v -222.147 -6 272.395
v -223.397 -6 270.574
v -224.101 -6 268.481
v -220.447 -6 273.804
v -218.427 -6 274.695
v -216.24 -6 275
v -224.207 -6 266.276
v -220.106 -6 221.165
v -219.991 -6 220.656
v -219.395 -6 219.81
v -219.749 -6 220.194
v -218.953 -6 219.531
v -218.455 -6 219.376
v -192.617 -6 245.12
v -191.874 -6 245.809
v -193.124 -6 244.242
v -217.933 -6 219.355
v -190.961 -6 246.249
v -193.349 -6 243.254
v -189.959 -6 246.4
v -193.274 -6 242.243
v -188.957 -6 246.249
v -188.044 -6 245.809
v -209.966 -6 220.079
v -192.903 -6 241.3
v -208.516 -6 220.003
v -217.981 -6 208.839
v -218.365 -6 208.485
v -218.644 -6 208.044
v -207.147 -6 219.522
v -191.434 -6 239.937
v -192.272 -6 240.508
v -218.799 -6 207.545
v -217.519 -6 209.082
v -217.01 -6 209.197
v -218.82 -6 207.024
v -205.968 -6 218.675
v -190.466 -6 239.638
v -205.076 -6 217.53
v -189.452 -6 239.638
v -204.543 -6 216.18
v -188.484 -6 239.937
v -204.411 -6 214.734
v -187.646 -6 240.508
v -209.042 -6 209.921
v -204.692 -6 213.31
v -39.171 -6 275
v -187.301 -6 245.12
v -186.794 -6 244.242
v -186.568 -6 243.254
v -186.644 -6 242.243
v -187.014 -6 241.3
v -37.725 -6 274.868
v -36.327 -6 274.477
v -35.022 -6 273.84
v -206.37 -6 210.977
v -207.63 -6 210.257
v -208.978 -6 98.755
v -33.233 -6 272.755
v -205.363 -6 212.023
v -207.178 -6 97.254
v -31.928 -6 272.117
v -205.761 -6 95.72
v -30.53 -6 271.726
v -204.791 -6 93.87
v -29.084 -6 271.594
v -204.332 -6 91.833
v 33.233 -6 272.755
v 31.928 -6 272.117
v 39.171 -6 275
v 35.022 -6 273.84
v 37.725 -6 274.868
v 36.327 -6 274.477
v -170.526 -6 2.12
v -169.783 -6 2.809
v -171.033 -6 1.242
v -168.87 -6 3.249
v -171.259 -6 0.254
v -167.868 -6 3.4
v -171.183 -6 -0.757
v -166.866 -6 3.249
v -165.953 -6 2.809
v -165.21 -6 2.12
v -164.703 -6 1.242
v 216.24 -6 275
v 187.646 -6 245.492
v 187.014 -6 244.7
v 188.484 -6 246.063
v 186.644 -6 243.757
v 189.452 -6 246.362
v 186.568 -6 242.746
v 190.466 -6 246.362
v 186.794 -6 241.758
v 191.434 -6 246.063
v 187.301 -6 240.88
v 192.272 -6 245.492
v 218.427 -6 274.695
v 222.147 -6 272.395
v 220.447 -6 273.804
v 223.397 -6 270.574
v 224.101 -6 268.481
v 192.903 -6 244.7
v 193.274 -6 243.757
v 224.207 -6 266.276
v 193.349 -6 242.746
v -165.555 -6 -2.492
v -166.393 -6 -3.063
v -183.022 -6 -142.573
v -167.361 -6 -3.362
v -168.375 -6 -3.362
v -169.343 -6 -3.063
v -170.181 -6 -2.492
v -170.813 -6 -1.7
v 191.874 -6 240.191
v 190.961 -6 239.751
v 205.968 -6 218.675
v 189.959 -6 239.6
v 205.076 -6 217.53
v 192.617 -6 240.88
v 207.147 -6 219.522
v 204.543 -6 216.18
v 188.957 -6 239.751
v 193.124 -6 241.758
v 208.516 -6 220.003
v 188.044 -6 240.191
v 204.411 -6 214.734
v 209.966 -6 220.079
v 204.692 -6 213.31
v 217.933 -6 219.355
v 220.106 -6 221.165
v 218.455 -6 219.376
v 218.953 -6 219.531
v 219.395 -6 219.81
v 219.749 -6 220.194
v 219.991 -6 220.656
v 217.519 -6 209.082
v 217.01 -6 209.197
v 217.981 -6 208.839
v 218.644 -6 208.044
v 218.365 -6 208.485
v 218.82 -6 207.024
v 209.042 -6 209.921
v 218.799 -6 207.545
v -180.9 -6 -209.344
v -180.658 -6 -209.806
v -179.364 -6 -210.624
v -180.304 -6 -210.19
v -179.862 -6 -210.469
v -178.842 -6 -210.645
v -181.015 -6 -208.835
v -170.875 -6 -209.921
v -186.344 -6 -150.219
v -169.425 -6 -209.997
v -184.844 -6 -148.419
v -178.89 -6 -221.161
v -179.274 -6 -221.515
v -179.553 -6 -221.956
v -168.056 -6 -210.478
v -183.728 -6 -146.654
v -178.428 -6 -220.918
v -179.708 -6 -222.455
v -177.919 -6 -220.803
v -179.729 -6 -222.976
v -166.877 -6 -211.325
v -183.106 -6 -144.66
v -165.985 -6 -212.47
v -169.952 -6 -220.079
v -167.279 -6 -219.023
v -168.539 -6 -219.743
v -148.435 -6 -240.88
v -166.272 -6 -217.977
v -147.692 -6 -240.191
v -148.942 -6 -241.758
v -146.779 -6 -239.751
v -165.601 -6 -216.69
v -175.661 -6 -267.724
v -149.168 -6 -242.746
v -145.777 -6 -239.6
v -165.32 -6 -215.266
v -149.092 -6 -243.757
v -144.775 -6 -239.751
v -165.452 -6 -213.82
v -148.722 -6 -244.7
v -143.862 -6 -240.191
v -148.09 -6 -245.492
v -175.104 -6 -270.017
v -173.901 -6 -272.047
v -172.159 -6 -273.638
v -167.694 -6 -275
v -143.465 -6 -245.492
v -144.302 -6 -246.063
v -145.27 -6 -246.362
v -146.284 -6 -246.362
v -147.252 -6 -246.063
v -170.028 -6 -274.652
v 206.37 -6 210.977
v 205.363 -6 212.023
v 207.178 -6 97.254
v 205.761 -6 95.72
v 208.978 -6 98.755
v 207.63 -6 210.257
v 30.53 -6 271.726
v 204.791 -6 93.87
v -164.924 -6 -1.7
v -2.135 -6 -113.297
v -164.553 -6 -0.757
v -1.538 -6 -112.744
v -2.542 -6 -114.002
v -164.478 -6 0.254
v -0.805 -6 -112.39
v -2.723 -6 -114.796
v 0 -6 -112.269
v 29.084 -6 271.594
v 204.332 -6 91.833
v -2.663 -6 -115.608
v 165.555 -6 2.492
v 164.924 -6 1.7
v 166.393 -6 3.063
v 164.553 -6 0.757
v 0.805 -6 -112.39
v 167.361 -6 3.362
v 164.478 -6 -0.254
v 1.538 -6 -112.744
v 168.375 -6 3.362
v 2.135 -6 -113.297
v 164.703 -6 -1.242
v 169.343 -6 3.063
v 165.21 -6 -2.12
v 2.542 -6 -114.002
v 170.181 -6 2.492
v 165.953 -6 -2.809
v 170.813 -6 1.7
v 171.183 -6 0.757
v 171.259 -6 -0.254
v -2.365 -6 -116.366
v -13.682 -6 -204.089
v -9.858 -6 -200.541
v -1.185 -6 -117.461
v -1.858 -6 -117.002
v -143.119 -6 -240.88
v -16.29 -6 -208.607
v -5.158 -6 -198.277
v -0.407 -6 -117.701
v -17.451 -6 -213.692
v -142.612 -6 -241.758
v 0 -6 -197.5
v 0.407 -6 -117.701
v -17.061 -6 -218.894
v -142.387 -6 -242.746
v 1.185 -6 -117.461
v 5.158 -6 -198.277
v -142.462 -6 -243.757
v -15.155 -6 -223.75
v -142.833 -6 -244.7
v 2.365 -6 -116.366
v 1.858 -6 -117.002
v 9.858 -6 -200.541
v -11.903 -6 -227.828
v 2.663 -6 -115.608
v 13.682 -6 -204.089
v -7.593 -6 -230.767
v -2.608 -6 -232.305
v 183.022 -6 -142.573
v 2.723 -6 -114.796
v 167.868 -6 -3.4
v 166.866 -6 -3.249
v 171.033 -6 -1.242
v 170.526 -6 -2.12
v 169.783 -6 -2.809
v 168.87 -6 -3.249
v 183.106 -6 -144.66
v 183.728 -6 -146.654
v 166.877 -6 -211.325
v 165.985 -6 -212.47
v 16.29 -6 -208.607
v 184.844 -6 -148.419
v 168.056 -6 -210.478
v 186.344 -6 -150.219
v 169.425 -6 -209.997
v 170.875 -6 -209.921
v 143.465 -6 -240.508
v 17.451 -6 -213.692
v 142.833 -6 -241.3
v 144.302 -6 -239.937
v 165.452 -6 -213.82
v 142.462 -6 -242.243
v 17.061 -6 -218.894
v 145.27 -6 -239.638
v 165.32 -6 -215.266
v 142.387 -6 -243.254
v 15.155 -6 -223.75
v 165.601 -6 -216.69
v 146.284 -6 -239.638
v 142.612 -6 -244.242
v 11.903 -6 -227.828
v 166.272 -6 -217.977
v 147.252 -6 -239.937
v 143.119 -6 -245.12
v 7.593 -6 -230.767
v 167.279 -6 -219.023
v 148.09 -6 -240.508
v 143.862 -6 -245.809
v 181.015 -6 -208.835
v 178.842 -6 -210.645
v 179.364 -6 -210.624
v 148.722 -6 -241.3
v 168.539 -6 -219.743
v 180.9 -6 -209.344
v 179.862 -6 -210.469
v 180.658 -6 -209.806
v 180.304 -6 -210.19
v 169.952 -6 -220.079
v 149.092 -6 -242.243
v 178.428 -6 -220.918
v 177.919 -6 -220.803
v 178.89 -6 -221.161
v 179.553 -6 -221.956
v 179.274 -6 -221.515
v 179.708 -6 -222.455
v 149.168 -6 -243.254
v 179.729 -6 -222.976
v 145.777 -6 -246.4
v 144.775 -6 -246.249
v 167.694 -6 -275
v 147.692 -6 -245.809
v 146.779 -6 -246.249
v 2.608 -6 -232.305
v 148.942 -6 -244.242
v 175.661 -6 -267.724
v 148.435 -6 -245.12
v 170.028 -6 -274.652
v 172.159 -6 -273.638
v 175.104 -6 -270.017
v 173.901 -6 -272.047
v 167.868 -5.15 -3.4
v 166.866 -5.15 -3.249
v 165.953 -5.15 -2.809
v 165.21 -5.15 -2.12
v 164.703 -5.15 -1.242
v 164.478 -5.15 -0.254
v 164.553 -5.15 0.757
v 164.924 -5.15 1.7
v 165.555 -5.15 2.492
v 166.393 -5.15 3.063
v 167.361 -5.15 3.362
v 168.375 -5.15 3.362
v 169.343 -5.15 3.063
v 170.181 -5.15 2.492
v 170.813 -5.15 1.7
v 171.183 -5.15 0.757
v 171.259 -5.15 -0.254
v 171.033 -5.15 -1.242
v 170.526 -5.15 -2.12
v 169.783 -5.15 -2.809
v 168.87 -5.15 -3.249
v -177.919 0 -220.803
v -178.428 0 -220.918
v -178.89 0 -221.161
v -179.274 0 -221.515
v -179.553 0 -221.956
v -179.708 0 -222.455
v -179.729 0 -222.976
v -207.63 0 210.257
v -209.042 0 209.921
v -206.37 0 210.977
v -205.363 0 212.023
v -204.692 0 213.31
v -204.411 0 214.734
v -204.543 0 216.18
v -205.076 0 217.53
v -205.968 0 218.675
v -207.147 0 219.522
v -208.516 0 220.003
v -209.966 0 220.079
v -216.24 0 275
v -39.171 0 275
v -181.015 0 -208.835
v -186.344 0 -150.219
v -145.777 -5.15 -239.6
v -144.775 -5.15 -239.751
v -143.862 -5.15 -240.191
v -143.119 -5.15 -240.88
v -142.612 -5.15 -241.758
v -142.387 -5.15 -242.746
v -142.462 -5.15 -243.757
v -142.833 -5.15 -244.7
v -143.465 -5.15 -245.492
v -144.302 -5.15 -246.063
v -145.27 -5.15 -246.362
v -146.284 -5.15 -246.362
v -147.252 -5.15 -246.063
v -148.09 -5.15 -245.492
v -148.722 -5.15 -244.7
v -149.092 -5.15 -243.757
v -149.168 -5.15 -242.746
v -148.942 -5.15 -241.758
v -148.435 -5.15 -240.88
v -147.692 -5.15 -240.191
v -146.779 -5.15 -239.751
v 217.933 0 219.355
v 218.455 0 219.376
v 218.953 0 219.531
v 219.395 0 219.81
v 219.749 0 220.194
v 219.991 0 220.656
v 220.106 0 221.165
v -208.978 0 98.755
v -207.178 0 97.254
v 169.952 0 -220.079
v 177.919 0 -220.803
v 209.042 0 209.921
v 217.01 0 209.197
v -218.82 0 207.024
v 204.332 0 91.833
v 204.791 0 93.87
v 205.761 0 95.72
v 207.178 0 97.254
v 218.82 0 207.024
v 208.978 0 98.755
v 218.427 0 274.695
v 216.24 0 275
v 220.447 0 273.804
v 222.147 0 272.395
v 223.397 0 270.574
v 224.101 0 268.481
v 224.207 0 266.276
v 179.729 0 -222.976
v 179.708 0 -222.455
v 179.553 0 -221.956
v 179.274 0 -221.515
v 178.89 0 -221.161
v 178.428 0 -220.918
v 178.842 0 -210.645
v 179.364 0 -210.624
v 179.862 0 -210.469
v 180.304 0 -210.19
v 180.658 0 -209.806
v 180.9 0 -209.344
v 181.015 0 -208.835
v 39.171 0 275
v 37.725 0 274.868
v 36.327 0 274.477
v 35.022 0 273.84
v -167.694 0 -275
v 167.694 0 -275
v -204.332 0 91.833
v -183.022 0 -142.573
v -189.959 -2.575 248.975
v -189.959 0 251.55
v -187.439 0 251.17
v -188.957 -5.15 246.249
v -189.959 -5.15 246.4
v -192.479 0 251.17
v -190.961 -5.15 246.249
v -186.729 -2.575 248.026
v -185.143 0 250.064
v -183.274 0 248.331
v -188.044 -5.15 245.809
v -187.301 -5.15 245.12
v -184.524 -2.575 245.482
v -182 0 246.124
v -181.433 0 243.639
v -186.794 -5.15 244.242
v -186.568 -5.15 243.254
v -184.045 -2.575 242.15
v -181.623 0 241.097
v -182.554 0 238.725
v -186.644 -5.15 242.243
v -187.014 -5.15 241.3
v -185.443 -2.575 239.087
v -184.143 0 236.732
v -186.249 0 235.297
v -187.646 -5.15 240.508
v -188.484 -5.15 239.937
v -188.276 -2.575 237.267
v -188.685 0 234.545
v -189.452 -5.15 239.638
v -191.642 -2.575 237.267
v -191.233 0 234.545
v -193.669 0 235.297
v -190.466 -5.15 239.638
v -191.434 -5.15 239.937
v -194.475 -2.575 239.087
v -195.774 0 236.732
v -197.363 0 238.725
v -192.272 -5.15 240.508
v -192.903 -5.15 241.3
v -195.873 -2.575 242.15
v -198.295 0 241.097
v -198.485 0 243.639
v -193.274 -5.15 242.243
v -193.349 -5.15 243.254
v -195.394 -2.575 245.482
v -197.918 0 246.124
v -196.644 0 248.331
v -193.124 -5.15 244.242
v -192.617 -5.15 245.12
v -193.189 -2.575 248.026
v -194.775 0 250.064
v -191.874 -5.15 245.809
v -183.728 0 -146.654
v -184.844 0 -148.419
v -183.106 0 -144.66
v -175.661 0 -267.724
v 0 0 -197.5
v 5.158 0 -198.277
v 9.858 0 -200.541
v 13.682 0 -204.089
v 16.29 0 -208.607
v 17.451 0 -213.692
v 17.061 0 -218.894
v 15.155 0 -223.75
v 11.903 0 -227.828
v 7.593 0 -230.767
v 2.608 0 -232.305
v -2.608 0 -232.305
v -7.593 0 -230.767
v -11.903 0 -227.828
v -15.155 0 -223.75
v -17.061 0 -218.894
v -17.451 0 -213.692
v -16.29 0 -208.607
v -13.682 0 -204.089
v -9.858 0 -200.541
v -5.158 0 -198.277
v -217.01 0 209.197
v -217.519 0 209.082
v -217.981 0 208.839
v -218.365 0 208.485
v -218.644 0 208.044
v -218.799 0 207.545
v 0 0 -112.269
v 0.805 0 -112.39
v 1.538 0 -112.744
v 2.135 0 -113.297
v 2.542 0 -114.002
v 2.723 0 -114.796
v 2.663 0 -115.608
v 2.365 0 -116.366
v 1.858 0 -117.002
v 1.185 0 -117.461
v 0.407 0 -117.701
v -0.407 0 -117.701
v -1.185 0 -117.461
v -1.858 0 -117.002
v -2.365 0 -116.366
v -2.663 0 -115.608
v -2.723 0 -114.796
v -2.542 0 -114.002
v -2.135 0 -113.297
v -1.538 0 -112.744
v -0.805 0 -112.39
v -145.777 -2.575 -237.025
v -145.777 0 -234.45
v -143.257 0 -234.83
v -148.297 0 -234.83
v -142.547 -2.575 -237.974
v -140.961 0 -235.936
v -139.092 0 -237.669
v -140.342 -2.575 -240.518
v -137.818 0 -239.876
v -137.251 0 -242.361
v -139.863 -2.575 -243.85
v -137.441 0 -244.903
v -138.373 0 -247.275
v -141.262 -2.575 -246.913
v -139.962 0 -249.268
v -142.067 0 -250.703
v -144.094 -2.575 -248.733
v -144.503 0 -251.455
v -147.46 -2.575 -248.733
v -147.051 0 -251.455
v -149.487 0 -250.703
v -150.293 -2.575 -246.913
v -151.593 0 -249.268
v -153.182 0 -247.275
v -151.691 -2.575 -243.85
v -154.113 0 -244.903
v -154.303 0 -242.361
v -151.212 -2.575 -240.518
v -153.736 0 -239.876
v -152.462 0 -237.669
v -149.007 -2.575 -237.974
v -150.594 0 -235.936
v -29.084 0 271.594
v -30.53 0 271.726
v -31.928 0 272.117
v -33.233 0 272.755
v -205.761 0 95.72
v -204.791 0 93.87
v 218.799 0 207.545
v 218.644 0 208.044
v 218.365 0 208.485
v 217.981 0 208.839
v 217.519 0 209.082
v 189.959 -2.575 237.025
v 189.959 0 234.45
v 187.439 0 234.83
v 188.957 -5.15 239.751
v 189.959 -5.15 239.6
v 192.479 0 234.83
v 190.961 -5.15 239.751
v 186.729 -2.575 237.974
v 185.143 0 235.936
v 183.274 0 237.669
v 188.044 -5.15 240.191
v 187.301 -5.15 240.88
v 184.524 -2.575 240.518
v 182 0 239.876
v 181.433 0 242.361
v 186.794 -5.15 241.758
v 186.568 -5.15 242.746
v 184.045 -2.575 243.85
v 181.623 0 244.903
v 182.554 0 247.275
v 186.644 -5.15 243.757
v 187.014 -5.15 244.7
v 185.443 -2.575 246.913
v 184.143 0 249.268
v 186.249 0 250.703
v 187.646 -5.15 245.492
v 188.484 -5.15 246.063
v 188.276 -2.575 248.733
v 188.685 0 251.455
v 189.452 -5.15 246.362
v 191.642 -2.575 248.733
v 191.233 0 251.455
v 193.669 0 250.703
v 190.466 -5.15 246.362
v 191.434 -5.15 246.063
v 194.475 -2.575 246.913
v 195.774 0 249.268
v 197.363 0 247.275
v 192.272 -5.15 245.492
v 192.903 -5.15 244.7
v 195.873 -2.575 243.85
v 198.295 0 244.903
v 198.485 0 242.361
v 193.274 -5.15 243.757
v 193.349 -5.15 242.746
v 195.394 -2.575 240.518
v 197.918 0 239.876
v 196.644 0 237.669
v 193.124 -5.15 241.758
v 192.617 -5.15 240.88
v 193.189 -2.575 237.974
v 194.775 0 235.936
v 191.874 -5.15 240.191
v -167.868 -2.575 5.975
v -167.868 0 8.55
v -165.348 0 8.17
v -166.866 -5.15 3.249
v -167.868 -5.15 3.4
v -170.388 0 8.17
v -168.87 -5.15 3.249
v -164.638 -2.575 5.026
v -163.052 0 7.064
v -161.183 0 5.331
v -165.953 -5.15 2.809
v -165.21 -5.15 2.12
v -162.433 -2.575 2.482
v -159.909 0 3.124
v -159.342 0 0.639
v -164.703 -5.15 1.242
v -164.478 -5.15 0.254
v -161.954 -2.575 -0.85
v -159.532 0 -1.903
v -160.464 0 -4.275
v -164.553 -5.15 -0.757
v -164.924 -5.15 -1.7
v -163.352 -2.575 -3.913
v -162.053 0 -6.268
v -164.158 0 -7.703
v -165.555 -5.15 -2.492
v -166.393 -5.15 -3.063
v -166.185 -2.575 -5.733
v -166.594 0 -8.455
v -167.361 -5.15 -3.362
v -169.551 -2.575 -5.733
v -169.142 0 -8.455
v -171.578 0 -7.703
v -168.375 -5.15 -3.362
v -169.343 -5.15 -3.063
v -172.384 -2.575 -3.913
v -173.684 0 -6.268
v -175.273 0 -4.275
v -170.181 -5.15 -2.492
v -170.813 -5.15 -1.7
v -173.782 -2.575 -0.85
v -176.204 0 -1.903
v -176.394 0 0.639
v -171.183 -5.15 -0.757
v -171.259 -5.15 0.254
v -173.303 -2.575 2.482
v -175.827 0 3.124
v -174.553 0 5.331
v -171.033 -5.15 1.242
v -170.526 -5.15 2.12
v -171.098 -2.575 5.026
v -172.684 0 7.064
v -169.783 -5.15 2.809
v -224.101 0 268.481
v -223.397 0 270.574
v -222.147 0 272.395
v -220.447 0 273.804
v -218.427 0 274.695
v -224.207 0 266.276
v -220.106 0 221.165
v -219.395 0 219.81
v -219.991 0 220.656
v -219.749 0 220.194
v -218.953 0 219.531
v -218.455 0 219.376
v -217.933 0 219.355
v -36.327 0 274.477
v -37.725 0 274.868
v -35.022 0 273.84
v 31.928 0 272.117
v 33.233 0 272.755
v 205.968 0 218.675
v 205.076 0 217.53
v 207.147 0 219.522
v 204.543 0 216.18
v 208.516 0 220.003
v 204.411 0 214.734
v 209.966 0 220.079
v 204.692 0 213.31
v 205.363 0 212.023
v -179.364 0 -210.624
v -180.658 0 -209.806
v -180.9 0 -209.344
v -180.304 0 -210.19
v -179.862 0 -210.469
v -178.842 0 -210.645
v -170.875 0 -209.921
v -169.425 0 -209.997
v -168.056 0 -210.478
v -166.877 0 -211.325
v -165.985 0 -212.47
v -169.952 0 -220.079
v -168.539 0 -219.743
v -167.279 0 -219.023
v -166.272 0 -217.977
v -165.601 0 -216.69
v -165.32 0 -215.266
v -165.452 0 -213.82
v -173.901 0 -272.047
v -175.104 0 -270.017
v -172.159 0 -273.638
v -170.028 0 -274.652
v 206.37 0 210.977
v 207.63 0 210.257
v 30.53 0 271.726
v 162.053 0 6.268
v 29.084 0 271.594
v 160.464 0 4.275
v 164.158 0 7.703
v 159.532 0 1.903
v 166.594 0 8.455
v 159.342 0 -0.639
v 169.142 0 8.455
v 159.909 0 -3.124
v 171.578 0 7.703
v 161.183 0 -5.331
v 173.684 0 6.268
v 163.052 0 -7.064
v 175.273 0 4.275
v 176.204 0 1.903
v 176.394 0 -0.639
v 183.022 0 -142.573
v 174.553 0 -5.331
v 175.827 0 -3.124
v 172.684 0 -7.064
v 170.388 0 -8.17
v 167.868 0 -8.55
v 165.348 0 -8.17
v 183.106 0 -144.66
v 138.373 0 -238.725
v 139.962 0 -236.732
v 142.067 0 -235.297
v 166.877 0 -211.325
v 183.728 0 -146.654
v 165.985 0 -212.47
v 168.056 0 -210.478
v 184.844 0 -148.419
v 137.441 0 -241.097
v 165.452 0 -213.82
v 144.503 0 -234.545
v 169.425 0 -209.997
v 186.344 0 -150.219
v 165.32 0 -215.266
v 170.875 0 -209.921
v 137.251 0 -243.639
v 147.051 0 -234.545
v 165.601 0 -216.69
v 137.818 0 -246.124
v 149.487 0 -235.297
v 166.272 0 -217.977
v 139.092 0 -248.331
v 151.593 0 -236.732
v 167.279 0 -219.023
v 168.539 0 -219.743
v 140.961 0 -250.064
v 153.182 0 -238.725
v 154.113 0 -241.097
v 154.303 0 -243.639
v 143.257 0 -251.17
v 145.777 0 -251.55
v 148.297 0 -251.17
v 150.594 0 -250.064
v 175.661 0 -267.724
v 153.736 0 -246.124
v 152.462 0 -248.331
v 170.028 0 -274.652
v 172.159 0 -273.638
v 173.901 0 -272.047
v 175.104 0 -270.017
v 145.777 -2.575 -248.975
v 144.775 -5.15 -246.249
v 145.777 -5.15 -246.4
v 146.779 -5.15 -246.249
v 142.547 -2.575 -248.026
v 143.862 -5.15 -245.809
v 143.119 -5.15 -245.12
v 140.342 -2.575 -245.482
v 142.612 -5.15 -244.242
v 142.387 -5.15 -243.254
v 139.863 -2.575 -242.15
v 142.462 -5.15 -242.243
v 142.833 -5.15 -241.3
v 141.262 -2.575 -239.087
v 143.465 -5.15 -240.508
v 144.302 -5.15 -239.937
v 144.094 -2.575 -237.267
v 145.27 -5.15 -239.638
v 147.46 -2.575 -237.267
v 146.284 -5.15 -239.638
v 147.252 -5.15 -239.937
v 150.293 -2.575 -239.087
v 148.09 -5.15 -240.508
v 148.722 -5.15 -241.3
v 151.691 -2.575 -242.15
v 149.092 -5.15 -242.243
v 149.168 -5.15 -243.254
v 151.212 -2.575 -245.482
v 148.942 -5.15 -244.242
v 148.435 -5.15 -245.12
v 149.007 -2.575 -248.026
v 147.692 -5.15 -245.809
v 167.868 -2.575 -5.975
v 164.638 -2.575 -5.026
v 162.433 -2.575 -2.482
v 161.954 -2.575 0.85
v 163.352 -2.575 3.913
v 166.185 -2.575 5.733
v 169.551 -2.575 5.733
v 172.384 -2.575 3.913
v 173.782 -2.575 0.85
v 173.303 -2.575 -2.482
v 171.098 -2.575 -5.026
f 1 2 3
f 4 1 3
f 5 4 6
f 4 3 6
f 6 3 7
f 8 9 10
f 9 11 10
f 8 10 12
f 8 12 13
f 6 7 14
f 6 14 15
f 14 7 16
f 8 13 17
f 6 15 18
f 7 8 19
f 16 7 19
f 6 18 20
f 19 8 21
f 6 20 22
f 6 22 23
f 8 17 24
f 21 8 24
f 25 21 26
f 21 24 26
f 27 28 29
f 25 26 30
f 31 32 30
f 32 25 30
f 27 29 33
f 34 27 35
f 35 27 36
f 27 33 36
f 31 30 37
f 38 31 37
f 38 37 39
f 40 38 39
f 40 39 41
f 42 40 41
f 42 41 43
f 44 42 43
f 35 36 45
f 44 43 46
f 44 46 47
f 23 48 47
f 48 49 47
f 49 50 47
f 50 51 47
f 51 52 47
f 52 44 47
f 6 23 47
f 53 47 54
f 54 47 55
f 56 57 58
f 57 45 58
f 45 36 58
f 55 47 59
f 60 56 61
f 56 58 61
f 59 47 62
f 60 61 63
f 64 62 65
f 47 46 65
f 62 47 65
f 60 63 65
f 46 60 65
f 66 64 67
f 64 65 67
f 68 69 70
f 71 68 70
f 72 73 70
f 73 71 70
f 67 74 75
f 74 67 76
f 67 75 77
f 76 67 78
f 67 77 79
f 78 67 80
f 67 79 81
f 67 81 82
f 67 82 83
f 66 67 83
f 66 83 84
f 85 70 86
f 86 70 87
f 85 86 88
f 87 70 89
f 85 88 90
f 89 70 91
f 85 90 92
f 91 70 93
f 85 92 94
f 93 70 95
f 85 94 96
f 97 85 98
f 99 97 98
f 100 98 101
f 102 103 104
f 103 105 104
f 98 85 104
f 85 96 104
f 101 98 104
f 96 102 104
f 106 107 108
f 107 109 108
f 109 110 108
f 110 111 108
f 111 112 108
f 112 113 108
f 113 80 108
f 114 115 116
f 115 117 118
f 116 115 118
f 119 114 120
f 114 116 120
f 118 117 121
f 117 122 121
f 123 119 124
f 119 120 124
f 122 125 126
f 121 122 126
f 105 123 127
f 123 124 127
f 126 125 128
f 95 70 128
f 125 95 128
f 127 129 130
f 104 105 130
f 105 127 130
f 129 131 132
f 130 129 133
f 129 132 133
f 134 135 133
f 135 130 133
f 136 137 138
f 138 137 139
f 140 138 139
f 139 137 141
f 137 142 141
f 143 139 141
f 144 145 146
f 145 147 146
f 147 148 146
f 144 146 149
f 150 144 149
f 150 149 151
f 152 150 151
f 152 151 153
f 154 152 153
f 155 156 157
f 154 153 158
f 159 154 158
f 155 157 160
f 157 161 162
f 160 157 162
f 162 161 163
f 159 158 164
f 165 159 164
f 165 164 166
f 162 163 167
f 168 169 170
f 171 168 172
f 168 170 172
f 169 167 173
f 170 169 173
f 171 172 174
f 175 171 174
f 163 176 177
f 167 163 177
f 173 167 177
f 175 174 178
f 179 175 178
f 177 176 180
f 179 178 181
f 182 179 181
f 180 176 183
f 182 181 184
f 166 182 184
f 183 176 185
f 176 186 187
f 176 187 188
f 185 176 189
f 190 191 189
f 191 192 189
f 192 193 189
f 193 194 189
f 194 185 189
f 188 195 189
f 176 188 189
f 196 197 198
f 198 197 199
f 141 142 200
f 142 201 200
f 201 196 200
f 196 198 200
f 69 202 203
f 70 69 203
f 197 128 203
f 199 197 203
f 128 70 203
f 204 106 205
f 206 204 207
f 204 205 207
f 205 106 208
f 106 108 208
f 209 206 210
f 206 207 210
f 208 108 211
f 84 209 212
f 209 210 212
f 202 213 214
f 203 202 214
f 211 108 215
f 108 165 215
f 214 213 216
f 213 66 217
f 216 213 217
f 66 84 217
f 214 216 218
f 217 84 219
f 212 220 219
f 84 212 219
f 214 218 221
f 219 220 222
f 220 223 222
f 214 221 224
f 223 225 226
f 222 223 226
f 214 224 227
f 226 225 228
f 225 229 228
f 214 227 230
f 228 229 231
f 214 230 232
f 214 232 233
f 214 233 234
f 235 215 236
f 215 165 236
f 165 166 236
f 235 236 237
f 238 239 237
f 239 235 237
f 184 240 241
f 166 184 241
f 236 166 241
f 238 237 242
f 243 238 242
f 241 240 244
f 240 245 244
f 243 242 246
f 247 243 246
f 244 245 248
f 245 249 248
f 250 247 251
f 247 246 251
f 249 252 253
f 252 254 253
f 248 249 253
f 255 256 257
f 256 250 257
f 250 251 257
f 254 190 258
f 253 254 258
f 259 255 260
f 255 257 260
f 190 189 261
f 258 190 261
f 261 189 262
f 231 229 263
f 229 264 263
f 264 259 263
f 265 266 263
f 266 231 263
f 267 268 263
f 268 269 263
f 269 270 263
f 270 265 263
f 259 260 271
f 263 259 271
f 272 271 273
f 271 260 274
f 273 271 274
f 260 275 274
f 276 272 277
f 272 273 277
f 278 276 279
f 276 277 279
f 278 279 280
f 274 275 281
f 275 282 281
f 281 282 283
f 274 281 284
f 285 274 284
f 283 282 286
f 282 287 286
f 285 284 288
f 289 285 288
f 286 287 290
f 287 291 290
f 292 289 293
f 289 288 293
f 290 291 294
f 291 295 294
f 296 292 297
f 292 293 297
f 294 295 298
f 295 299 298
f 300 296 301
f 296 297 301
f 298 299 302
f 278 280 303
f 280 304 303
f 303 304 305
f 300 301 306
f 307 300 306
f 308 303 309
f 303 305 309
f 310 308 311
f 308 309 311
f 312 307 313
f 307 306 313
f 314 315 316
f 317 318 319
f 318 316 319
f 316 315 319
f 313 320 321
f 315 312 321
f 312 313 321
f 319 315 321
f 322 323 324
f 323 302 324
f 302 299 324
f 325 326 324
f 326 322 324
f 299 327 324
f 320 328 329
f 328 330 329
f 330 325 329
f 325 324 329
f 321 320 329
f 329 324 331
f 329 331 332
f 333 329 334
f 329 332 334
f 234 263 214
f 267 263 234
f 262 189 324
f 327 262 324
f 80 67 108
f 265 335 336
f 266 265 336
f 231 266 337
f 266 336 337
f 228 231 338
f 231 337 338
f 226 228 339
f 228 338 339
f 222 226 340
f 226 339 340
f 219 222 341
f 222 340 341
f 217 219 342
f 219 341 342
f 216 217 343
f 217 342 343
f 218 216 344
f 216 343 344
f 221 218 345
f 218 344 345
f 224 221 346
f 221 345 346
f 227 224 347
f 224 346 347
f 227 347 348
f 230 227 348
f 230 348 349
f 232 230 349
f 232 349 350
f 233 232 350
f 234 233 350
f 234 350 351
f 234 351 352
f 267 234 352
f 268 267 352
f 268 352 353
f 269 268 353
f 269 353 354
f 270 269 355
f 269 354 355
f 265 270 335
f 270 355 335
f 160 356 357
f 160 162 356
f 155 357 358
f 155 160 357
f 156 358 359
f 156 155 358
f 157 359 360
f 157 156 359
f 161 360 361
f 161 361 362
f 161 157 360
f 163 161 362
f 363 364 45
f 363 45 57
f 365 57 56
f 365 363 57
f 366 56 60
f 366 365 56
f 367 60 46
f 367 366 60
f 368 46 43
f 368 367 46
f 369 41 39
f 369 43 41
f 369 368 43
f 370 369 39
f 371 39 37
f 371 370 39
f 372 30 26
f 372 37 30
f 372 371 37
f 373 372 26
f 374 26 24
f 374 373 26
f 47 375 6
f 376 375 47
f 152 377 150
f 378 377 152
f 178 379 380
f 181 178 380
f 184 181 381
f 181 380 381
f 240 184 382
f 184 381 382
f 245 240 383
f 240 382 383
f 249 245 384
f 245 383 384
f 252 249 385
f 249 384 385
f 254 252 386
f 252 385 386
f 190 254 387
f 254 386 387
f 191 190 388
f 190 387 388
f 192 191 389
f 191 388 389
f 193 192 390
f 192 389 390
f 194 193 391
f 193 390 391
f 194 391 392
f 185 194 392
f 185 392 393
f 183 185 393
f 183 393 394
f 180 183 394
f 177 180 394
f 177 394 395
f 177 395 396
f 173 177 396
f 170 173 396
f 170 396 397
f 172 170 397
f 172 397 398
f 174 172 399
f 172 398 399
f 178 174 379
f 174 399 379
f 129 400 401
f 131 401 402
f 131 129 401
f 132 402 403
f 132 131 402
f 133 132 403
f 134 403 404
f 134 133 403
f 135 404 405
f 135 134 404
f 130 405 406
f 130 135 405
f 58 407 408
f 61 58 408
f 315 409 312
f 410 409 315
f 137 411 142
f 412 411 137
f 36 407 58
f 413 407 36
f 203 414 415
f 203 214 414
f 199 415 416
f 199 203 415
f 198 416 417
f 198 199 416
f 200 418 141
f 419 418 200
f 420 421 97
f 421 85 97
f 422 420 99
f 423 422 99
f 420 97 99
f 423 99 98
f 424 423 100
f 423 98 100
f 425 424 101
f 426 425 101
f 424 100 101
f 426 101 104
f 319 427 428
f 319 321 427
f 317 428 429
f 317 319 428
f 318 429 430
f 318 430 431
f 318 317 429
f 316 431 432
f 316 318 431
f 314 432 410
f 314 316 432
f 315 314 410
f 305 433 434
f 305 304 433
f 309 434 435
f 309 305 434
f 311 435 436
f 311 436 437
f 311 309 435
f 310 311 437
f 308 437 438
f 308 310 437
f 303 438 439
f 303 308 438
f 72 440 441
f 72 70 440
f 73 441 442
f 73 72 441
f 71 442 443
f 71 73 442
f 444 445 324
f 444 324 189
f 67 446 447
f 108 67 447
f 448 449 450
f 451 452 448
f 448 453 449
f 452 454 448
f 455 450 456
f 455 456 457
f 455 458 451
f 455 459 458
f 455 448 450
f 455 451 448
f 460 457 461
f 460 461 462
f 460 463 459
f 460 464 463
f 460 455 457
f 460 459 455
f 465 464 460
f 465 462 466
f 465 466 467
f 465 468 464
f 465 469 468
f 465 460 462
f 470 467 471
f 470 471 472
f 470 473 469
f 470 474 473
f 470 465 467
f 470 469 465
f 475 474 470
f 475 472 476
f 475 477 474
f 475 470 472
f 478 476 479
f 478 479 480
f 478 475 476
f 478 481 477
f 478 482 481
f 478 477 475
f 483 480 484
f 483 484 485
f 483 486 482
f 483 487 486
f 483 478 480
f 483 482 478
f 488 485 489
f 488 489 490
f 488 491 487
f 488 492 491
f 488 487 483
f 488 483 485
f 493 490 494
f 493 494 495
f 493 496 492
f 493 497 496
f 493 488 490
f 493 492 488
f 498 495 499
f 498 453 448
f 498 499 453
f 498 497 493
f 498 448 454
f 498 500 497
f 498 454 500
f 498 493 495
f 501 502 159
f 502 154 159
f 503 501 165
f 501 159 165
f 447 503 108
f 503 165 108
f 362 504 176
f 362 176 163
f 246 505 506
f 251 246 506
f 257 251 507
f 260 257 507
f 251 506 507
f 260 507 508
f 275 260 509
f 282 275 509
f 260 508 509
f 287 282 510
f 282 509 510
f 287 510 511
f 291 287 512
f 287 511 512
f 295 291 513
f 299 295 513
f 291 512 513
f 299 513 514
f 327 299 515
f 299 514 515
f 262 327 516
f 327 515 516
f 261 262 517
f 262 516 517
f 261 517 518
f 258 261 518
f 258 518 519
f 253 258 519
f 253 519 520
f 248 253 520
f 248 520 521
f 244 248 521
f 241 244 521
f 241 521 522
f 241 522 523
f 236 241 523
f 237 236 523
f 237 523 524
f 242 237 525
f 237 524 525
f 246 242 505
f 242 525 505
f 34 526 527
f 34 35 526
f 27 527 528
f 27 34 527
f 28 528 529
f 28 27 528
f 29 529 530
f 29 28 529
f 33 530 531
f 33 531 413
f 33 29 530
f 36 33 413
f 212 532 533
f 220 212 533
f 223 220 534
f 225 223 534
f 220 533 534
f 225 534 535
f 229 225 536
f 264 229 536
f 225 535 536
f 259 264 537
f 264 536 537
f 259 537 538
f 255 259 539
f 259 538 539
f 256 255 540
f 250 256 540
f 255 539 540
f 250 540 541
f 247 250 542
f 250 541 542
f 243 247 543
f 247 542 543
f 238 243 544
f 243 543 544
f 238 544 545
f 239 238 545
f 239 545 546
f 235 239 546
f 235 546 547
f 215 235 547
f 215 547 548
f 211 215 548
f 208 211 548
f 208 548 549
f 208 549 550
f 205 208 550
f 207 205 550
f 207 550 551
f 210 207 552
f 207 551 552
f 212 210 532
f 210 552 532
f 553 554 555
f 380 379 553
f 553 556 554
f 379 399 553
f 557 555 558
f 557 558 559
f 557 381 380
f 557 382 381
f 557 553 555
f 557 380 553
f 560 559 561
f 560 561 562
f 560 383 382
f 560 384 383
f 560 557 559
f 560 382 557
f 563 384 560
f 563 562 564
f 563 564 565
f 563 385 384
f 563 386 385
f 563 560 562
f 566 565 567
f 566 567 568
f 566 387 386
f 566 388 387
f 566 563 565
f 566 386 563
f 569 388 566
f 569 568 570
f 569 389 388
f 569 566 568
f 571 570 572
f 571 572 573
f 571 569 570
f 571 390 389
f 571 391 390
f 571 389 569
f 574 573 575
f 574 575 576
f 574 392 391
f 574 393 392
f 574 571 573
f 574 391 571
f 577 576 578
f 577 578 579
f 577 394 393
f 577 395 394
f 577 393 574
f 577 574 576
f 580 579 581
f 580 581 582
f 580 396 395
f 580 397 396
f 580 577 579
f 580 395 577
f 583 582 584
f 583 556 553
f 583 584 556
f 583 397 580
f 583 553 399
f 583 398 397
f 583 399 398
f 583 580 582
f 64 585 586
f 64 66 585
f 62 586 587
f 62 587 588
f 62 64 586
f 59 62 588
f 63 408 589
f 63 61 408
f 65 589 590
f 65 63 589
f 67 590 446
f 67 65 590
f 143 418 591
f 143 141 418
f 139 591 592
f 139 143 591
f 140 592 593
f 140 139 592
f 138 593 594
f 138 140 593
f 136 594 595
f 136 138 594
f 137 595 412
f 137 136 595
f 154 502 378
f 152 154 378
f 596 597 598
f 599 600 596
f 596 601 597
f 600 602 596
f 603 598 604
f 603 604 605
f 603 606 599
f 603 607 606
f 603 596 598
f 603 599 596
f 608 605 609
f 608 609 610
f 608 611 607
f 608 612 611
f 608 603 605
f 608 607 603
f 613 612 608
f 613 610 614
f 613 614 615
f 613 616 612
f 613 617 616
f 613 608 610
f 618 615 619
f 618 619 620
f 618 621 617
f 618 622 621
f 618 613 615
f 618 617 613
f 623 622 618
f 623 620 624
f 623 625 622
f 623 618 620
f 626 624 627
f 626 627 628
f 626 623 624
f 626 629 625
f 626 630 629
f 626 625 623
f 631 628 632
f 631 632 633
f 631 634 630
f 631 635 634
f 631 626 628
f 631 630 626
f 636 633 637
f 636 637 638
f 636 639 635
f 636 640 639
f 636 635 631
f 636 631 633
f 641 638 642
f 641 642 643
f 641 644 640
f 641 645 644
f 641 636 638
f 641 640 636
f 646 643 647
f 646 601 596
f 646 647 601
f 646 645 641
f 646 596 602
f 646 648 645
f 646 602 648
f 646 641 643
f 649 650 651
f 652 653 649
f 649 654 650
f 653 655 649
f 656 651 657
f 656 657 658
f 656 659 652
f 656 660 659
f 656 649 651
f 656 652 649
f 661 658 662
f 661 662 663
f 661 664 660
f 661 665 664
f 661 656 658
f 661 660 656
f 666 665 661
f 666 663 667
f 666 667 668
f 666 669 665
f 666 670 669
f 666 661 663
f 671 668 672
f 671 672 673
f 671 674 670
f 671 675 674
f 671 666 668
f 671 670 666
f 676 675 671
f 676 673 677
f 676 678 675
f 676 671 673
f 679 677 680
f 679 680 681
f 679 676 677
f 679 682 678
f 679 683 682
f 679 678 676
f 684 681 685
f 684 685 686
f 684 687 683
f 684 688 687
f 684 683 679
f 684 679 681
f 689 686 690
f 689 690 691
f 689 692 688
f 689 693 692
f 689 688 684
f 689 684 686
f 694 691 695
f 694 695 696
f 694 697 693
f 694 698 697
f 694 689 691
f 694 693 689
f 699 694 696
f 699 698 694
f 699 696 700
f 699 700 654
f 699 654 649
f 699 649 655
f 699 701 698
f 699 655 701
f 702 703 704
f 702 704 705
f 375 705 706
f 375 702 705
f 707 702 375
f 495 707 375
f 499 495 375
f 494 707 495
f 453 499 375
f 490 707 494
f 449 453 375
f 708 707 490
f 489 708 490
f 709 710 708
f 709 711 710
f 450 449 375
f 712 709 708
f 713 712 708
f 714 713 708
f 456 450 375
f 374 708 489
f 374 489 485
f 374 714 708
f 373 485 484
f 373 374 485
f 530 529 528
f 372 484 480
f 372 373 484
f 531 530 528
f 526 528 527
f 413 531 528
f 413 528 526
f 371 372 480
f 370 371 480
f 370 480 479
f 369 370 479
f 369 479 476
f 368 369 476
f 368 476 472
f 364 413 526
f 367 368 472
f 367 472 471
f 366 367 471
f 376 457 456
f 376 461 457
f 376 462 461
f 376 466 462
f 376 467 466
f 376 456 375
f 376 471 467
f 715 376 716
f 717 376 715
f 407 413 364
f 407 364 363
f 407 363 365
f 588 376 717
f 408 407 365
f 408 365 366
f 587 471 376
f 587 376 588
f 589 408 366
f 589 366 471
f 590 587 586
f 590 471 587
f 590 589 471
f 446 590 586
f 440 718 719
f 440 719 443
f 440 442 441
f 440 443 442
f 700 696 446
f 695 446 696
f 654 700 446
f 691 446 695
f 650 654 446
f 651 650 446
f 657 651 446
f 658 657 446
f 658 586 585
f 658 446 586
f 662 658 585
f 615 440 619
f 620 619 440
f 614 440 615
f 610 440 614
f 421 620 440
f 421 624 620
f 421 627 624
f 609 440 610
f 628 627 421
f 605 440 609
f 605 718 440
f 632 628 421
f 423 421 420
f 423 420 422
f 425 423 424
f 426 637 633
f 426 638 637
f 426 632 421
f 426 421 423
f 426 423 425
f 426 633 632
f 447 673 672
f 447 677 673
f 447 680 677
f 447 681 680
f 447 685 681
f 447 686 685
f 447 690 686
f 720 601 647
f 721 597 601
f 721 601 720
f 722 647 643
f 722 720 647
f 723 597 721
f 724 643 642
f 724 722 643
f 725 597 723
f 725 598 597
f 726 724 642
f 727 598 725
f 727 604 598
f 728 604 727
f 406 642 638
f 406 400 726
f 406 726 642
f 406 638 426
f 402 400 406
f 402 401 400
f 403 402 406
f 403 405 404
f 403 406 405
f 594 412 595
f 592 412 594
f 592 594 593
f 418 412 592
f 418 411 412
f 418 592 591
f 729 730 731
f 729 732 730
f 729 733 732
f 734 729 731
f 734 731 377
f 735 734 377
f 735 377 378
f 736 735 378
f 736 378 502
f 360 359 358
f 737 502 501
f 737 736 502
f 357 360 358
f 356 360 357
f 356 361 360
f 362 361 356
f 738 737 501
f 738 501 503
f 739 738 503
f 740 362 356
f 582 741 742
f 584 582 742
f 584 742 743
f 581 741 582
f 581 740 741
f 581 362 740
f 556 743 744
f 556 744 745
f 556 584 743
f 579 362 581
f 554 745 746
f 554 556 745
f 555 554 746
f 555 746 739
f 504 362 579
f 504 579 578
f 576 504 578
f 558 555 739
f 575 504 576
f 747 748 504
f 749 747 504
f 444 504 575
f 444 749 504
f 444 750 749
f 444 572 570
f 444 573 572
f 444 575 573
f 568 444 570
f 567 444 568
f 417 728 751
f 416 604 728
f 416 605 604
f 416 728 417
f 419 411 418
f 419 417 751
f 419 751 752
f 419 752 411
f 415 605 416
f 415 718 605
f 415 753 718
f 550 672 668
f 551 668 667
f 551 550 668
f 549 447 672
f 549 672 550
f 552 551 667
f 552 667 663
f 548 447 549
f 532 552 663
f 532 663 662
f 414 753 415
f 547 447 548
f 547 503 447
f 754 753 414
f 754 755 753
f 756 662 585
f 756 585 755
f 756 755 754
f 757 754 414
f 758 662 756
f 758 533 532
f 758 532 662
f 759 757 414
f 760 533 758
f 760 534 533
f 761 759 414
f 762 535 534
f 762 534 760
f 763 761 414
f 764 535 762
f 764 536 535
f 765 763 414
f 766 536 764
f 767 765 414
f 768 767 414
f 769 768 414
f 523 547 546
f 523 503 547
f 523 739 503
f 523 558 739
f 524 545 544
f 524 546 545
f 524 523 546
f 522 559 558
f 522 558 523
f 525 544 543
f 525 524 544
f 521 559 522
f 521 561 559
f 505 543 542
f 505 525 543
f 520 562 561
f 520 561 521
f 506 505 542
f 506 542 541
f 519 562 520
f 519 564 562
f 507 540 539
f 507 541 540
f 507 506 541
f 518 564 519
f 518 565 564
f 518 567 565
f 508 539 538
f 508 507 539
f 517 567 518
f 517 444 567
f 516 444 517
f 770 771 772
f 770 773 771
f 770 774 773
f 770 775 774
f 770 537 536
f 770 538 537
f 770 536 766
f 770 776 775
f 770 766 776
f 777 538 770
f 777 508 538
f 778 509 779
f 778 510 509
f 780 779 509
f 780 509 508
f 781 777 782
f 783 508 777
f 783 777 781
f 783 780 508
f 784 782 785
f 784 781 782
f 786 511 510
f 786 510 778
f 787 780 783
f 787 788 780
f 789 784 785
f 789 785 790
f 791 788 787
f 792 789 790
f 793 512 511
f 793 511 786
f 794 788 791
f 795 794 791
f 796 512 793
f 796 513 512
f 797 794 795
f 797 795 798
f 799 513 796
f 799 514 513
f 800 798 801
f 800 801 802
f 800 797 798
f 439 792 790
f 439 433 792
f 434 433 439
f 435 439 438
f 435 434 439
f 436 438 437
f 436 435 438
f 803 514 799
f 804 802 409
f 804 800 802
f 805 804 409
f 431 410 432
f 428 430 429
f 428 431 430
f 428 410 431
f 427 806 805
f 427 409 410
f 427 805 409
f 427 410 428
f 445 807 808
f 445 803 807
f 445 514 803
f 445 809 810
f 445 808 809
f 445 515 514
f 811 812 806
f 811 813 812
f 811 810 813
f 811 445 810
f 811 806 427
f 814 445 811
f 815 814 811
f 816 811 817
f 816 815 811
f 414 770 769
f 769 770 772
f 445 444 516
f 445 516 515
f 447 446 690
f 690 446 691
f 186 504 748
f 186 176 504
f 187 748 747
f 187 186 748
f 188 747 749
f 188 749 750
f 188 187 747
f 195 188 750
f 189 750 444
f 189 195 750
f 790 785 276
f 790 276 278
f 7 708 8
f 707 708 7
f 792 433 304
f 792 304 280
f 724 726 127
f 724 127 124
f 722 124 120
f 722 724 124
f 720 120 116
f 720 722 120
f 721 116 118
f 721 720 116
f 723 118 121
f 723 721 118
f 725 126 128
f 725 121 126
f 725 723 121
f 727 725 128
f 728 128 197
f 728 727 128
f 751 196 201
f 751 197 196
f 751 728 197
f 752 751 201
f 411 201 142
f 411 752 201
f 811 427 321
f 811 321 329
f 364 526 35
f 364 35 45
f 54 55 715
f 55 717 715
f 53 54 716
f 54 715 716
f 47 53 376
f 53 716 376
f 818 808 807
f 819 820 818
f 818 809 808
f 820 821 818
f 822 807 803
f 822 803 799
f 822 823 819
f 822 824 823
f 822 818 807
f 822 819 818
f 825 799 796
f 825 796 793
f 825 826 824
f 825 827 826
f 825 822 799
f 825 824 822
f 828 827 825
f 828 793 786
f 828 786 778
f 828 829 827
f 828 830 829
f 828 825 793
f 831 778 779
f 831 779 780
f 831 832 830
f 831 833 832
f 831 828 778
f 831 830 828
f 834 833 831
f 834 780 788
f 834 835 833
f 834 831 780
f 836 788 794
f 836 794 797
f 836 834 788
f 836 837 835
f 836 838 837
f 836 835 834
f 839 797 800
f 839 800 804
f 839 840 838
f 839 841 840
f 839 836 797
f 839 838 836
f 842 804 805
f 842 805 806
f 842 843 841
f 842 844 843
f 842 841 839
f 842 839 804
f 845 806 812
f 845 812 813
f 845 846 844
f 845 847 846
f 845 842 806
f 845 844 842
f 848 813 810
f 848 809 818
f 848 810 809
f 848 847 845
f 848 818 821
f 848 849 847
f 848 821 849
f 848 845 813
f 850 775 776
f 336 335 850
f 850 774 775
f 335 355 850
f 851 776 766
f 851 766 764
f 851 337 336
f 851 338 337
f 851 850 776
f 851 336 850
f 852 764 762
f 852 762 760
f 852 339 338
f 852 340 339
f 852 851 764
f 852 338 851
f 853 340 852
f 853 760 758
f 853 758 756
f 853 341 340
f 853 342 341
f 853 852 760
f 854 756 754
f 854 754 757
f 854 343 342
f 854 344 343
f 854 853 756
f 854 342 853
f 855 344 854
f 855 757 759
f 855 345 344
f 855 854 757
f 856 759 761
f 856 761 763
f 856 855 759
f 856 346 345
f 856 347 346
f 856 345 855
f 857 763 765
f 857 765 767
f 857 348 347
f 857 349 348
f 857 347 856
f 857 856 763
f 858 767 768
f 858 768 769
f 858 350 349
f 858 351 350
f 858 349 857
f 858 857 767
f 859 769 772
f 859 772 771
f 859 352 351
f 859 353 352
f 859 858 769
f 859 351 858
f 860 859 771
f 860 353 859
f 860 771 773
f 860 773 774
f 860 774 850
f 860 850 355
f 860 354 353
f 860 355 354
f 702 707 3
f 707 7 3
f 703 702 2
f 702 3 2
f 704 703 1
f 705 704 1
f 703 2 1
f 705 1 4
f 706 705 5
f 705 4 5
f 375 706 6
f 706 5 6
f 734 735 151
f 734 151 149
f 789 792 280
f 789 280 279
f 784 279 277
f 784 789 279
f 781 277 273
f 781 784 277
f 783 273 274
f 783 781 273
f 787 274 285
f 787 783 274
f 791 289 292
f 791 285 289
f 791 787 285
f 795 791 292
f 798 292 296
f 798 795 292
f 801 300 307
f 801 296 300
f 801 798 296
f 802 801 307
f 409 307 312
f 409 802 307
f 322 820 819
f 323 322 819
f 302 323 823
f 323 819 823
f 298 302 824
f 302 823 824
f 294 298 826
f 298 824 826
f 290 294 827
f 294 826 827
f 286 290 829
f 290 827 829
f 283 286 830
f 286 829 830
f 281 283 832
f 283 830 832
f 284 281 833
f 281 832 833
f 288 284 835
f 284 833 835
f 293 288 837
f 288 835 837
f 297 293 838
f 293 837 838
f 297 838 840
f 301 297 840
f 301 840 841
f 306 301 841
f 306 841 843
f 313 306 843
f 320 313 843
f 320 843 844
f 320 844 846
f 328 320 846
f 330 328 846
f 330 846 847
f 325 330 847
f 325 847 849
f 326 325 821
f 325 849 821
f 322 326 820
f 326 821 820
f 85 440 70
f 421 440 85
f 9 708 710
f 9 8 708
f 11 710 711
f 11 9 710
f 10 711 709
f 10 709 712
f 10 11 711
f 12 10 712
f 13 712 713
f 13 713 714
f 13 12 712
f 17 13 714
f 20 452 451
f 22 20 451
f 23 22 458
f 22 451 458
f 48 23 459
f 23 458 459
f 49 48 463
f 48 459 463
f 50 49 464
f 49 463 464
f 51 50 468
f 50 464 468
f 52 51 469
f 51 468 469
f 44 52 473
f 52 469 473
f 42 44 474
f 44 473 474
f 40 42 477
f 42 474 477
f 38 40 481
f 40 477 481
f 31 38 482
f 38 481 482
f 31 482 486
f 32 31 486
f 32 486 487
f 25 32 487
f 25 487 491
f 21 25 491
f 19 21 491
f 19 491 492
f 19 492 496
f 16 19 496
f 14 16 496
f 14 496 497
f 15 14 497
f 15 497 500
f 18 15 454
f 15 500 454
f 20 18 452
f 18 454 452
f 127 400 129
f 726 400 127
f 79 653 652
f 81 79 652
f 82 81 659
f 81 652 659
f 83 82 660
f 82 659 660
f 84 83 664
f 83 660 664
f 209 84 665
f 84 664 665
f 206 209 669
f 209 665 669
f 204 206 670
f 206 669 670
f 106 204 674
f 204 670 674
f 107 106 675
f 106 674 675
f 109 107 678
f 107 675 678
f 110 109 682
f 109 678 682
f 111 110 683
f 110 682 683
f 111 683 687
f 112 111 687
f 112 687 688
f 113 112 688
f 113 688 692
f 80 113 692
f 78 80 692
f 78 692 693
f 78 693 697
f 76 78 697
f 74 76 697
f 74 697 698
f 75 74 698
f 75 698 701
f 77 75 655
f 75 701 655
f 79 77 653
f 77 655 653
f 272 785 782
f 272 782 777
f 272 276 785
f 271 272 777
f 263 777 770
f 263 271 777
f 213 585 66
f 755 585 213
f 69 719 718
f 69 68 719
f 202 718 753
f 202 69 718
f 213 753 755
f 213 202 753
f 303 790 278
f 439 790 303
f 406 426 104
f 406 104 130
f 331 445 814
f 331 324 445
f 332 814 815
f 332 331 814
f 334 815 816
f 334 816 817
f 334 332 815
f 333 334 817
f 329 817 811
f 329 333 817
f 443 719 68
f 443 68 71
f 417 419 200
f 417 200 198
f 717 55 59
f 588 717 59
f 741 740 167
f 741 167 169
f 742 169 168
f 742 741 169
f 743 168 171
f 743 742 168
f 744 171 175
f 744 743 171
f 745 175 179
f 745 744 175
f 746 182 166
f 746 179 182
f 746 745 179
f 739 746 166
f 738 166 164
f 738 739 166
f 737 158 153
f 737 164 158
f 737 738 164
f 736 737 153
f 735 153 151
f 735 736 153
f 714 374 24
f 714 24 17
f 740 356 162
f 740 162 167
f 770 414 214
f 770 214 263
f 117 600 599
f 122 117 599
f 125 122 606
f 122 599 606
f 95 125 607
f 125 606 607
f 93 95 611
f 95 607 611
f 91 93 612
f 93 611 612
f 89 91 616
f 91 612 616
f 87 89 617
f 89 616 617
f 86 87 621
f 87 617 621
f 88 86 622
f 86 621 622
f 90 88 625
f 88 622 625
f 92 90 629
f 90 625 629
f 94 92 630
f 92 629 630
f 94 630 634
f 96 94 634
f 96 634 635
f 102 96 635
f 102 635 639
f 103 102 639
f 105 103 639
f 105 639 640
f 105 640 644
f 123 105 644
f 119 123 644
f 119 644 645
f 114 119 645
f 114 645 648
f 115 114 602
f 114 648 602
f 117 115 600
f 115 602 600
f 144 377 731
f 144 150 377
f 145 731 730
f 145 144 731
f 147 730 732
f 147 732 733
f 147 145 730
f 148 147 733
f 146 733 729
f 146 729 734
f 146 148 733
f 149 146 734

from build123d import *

# Parameters (mm, degrees)
SKETCH1_R           = 17.5
SKETCH1_R_2         = 3.4
SKETCH1_R_3         = 2.731026391
BOSS_EXTRUDE1_DEPTH = 6
FILLET1_R           = 8
CUT_EXTRUDE5_DEPTH  = 10
CUT_EXTRUDE6_DEPTH  = 10
FILLET2_R           = 8
CHAMFER1_SIZE       = 5.15
CUT_EXTRUDE7_DEPTH  = 10
FILLET3_R           = 2


with BuildPart() as part:
    # Sketch1 → Boss-Extrude1 (new body)
    with BuildSketch(Plane(origin=(0, 0, 0), x_dir=(1, 0, 0), z_dir=(0, 1, 0))):
        Polygon((-175, 275), (-225, -275), (225, -275), (175, 275), align=None)
        with Locations(Location((0, 215, 0), (0, 0, 270))):
            Circle(SKETCH1_R, mode=Mode.SUBTRACT)
        with Locations(Location((-145.777131586, 243, 0), (0, 0, 270))):
            Circle(SKETCH1_R_2, mode=Mode.SUBTRACT)
        with Locations(Location((145.777131586, 243, 0), (0, 0, 90))):
            Circle(SKETCH1_R_2, mode=Mode.SUBTRACT)
        with Locations(Location((-189.958949768, -243, 0), (0, 0, 270))):
            Circle(SKETCH1_R_2, mode=Mode.SUBTRACT)
        with Locations(Location((189.958949768, -243, 0), (0, 0, 90))):
            Circle(SKETCH1_R_2, mode=Mode.SUBTRACT)
        with Locations(Location((-167.868040677, 0, 0), (0, 0, 270))):
            Circle(SKETCH1_R_2, mode=Mode.SUBTRACT)
        with Locations(Location((167.868040677, 0, 0), (0, 0, 90))):
            Circle(SKETCH1_R_2, mode=Mode.SUBTRACT)
        with Locations(Location((0, 115, 0), (0, 0, 270))):
            Circle(SKETCH1_R_3, mode=Mode.SUBTRACT)
    extrude(amount=-BOSS_EXTRUDE1_DEPTH)

    # Fillet1
    fillet1_edges = [part.edges().sort_by_distance(p)[0] for p in [
        (175, -3, -275),
        (225, -3, 275),
        (-225, -3, 275),
        (-175, -3, -275),
    ]]
    fillet(fillet1_edges, radius=FILLET1_R)

    # Sketch6 → Cut-Extrude5 (cut)
    with BuildSketch(Plane(origin=(0, 0, 0), x_dir=(1, 0, 0), z_dir=(0, 1, 0))):
        Polygon((-204.631966366, -95.133074099), (-182.722315824, 145.873081867), (-194.245635018, 159.701064899), (-218.459949399, -106.656393293), align=None)
    cut_extrude5 = extrude(amount=-CUT_EXTRUDE5_DEPTH, mode=Mode.SUBTRACT)

    # Sketch7 → Cut-Extrude6 (cut)
    with BuildSketch(Plane(origin=(0, 0, 0), x_dir=(1, 0, 0), z_dir=(0, 1, 0))):
        Polygon((-31.320564901, -271.594250629), (31.320564901, -271.594250629), (45, -279.893229805), (-45, -279.893229805), align=None)
    extrude(amount=-CUT_EXTRUDE6_DEPTH, mode=Mode.SUBTRACT)

    # Mirror2: Cut-Extrude5 across plane
    add(cut_extrude5.mirror(Plane(origin=(0, 0, 0), x_dir=(0, 0, 1), z_dir=(1, 0, 0))), mode=Mode.SUBTRACT)

    # Fillet2
    fillet2_edges = [part.edges().sort_by_distance(p)[0] for p in [
        (36.934355042, -3, 275),
        (-36.934355042, -3, 275),
        (-31.320564901, -3, 271.594250629),
        (31.320564901, -3, 271.594250629),
        (204.631966366, -3, 95.133074099),
        (182.722315824, -3, -145.873081867),
        (-182.722315824, -3, -145.873081867),
        (-204.631966366, -3, 95.133074099),
    ]]
    fillet(fillet2_edges, radius=FILLET2_R)

    # Chamfer1
    chamfer1_edges = [part.edges().sort_by_distance(p)[0] for p in [
        (-145.777131586, 0, -246.4),
        (145.777131586, 0, -239.6),
        (-189.958949768, 0, 239.6),
        (189.958949768, 0, 246.4),
        (-167.868040677, 0, -3.4),
        (167.868040677, 0, 3.4),
    ]]
    chamfer(chamfer1_edges, length=CHAMFER1_SIZE)

    # Sketch11 → Cut-Extrude7 (cut)
    with BuildSketch(Plane(origin=(0, 0, 0), x_dir=(1, 0, 0), z_dir=(0, 1, 0))):
        with BuildLine():
            Line((-179.910507926, 220.984412813), (-169.951575861, 220.079055353))
            ThreePointArc((-169.951575861, 220.079055353), (-165.334252813, 214.538267695), (-170.875040471, 209.920944647))
            Line((-170.875040471, 209.920944647), (-180.833972536, 210.826302107))
            Line((-180.833972536, 210.826302107), (-179.910507926, 220.984412813))
        make_face()
        with BuildLine():
            Line((-219.001417017, -209.015587187), (-209.042484952, -209.920944647))
            ThreePointArc((-209.042484952, -209.920944647), (-204.425161904, -215.461732305), (-209.965949562, -220.079055353))
            Line((-209.965949562, -220.079055353), (-219.924881627, -219.173697893))
            Line((-219.924881627, -219.173697893), (-219.001417017, -209.015587187))
        make_face()
        with BuildLine():
            Line((219.001417017, -209.015587187), (219.924881627, -219.173697893))
            Line((219.924881627, -219.173697893), (209.965949562, -220.079055353))
            ThreePointArc((209.965949562, -220.079055353), (204.425161904, -215.461732305), (209.042484952, -209.920944647))
            Line((209.042484952, -209.920944647), (219.001417017, -209.015587187))
        make_face()
        with BuildLine():
            Line((179.910507926, 220.984412813), (180.833972536, 210.826302107))
            Line((180.833972536, 210.826302107), (170.875040471, 209.920944647))
            ThreePointArc((170.875040471, 209.920944647), (165.334252813, 214.538267695), (169.951575861, 220.079055353))
            Line((169.951575861, 220.079055353), (179.910507926, 220.984412813))
        make_face()
    extrude(amount=-CUT_EXTRUDE7_DEPTH, mode=Mode.SUBTRACT)

    # Fillet3
    fillet3_edges = [part.edges().sort_by_distance(p)[0] for p in [
        (-180.833972536, -3, -210.826302107),
        (-179.910507926, -3, -220.984412813),
        (-219.924881627, -3, 219.173697893),
        (-219.001417017, -3, 209.015587187),
        (179.910507926, -3, -220.984412813),
        (180.833972536, -3, -210.826302107),
        (219.001417017, -3, 209.015587187),
        (219.924881627, -3, 219.173697893),
    ]]
    fillet(fillet3_edges, radius=FILLET3_R)


solid = part.part
